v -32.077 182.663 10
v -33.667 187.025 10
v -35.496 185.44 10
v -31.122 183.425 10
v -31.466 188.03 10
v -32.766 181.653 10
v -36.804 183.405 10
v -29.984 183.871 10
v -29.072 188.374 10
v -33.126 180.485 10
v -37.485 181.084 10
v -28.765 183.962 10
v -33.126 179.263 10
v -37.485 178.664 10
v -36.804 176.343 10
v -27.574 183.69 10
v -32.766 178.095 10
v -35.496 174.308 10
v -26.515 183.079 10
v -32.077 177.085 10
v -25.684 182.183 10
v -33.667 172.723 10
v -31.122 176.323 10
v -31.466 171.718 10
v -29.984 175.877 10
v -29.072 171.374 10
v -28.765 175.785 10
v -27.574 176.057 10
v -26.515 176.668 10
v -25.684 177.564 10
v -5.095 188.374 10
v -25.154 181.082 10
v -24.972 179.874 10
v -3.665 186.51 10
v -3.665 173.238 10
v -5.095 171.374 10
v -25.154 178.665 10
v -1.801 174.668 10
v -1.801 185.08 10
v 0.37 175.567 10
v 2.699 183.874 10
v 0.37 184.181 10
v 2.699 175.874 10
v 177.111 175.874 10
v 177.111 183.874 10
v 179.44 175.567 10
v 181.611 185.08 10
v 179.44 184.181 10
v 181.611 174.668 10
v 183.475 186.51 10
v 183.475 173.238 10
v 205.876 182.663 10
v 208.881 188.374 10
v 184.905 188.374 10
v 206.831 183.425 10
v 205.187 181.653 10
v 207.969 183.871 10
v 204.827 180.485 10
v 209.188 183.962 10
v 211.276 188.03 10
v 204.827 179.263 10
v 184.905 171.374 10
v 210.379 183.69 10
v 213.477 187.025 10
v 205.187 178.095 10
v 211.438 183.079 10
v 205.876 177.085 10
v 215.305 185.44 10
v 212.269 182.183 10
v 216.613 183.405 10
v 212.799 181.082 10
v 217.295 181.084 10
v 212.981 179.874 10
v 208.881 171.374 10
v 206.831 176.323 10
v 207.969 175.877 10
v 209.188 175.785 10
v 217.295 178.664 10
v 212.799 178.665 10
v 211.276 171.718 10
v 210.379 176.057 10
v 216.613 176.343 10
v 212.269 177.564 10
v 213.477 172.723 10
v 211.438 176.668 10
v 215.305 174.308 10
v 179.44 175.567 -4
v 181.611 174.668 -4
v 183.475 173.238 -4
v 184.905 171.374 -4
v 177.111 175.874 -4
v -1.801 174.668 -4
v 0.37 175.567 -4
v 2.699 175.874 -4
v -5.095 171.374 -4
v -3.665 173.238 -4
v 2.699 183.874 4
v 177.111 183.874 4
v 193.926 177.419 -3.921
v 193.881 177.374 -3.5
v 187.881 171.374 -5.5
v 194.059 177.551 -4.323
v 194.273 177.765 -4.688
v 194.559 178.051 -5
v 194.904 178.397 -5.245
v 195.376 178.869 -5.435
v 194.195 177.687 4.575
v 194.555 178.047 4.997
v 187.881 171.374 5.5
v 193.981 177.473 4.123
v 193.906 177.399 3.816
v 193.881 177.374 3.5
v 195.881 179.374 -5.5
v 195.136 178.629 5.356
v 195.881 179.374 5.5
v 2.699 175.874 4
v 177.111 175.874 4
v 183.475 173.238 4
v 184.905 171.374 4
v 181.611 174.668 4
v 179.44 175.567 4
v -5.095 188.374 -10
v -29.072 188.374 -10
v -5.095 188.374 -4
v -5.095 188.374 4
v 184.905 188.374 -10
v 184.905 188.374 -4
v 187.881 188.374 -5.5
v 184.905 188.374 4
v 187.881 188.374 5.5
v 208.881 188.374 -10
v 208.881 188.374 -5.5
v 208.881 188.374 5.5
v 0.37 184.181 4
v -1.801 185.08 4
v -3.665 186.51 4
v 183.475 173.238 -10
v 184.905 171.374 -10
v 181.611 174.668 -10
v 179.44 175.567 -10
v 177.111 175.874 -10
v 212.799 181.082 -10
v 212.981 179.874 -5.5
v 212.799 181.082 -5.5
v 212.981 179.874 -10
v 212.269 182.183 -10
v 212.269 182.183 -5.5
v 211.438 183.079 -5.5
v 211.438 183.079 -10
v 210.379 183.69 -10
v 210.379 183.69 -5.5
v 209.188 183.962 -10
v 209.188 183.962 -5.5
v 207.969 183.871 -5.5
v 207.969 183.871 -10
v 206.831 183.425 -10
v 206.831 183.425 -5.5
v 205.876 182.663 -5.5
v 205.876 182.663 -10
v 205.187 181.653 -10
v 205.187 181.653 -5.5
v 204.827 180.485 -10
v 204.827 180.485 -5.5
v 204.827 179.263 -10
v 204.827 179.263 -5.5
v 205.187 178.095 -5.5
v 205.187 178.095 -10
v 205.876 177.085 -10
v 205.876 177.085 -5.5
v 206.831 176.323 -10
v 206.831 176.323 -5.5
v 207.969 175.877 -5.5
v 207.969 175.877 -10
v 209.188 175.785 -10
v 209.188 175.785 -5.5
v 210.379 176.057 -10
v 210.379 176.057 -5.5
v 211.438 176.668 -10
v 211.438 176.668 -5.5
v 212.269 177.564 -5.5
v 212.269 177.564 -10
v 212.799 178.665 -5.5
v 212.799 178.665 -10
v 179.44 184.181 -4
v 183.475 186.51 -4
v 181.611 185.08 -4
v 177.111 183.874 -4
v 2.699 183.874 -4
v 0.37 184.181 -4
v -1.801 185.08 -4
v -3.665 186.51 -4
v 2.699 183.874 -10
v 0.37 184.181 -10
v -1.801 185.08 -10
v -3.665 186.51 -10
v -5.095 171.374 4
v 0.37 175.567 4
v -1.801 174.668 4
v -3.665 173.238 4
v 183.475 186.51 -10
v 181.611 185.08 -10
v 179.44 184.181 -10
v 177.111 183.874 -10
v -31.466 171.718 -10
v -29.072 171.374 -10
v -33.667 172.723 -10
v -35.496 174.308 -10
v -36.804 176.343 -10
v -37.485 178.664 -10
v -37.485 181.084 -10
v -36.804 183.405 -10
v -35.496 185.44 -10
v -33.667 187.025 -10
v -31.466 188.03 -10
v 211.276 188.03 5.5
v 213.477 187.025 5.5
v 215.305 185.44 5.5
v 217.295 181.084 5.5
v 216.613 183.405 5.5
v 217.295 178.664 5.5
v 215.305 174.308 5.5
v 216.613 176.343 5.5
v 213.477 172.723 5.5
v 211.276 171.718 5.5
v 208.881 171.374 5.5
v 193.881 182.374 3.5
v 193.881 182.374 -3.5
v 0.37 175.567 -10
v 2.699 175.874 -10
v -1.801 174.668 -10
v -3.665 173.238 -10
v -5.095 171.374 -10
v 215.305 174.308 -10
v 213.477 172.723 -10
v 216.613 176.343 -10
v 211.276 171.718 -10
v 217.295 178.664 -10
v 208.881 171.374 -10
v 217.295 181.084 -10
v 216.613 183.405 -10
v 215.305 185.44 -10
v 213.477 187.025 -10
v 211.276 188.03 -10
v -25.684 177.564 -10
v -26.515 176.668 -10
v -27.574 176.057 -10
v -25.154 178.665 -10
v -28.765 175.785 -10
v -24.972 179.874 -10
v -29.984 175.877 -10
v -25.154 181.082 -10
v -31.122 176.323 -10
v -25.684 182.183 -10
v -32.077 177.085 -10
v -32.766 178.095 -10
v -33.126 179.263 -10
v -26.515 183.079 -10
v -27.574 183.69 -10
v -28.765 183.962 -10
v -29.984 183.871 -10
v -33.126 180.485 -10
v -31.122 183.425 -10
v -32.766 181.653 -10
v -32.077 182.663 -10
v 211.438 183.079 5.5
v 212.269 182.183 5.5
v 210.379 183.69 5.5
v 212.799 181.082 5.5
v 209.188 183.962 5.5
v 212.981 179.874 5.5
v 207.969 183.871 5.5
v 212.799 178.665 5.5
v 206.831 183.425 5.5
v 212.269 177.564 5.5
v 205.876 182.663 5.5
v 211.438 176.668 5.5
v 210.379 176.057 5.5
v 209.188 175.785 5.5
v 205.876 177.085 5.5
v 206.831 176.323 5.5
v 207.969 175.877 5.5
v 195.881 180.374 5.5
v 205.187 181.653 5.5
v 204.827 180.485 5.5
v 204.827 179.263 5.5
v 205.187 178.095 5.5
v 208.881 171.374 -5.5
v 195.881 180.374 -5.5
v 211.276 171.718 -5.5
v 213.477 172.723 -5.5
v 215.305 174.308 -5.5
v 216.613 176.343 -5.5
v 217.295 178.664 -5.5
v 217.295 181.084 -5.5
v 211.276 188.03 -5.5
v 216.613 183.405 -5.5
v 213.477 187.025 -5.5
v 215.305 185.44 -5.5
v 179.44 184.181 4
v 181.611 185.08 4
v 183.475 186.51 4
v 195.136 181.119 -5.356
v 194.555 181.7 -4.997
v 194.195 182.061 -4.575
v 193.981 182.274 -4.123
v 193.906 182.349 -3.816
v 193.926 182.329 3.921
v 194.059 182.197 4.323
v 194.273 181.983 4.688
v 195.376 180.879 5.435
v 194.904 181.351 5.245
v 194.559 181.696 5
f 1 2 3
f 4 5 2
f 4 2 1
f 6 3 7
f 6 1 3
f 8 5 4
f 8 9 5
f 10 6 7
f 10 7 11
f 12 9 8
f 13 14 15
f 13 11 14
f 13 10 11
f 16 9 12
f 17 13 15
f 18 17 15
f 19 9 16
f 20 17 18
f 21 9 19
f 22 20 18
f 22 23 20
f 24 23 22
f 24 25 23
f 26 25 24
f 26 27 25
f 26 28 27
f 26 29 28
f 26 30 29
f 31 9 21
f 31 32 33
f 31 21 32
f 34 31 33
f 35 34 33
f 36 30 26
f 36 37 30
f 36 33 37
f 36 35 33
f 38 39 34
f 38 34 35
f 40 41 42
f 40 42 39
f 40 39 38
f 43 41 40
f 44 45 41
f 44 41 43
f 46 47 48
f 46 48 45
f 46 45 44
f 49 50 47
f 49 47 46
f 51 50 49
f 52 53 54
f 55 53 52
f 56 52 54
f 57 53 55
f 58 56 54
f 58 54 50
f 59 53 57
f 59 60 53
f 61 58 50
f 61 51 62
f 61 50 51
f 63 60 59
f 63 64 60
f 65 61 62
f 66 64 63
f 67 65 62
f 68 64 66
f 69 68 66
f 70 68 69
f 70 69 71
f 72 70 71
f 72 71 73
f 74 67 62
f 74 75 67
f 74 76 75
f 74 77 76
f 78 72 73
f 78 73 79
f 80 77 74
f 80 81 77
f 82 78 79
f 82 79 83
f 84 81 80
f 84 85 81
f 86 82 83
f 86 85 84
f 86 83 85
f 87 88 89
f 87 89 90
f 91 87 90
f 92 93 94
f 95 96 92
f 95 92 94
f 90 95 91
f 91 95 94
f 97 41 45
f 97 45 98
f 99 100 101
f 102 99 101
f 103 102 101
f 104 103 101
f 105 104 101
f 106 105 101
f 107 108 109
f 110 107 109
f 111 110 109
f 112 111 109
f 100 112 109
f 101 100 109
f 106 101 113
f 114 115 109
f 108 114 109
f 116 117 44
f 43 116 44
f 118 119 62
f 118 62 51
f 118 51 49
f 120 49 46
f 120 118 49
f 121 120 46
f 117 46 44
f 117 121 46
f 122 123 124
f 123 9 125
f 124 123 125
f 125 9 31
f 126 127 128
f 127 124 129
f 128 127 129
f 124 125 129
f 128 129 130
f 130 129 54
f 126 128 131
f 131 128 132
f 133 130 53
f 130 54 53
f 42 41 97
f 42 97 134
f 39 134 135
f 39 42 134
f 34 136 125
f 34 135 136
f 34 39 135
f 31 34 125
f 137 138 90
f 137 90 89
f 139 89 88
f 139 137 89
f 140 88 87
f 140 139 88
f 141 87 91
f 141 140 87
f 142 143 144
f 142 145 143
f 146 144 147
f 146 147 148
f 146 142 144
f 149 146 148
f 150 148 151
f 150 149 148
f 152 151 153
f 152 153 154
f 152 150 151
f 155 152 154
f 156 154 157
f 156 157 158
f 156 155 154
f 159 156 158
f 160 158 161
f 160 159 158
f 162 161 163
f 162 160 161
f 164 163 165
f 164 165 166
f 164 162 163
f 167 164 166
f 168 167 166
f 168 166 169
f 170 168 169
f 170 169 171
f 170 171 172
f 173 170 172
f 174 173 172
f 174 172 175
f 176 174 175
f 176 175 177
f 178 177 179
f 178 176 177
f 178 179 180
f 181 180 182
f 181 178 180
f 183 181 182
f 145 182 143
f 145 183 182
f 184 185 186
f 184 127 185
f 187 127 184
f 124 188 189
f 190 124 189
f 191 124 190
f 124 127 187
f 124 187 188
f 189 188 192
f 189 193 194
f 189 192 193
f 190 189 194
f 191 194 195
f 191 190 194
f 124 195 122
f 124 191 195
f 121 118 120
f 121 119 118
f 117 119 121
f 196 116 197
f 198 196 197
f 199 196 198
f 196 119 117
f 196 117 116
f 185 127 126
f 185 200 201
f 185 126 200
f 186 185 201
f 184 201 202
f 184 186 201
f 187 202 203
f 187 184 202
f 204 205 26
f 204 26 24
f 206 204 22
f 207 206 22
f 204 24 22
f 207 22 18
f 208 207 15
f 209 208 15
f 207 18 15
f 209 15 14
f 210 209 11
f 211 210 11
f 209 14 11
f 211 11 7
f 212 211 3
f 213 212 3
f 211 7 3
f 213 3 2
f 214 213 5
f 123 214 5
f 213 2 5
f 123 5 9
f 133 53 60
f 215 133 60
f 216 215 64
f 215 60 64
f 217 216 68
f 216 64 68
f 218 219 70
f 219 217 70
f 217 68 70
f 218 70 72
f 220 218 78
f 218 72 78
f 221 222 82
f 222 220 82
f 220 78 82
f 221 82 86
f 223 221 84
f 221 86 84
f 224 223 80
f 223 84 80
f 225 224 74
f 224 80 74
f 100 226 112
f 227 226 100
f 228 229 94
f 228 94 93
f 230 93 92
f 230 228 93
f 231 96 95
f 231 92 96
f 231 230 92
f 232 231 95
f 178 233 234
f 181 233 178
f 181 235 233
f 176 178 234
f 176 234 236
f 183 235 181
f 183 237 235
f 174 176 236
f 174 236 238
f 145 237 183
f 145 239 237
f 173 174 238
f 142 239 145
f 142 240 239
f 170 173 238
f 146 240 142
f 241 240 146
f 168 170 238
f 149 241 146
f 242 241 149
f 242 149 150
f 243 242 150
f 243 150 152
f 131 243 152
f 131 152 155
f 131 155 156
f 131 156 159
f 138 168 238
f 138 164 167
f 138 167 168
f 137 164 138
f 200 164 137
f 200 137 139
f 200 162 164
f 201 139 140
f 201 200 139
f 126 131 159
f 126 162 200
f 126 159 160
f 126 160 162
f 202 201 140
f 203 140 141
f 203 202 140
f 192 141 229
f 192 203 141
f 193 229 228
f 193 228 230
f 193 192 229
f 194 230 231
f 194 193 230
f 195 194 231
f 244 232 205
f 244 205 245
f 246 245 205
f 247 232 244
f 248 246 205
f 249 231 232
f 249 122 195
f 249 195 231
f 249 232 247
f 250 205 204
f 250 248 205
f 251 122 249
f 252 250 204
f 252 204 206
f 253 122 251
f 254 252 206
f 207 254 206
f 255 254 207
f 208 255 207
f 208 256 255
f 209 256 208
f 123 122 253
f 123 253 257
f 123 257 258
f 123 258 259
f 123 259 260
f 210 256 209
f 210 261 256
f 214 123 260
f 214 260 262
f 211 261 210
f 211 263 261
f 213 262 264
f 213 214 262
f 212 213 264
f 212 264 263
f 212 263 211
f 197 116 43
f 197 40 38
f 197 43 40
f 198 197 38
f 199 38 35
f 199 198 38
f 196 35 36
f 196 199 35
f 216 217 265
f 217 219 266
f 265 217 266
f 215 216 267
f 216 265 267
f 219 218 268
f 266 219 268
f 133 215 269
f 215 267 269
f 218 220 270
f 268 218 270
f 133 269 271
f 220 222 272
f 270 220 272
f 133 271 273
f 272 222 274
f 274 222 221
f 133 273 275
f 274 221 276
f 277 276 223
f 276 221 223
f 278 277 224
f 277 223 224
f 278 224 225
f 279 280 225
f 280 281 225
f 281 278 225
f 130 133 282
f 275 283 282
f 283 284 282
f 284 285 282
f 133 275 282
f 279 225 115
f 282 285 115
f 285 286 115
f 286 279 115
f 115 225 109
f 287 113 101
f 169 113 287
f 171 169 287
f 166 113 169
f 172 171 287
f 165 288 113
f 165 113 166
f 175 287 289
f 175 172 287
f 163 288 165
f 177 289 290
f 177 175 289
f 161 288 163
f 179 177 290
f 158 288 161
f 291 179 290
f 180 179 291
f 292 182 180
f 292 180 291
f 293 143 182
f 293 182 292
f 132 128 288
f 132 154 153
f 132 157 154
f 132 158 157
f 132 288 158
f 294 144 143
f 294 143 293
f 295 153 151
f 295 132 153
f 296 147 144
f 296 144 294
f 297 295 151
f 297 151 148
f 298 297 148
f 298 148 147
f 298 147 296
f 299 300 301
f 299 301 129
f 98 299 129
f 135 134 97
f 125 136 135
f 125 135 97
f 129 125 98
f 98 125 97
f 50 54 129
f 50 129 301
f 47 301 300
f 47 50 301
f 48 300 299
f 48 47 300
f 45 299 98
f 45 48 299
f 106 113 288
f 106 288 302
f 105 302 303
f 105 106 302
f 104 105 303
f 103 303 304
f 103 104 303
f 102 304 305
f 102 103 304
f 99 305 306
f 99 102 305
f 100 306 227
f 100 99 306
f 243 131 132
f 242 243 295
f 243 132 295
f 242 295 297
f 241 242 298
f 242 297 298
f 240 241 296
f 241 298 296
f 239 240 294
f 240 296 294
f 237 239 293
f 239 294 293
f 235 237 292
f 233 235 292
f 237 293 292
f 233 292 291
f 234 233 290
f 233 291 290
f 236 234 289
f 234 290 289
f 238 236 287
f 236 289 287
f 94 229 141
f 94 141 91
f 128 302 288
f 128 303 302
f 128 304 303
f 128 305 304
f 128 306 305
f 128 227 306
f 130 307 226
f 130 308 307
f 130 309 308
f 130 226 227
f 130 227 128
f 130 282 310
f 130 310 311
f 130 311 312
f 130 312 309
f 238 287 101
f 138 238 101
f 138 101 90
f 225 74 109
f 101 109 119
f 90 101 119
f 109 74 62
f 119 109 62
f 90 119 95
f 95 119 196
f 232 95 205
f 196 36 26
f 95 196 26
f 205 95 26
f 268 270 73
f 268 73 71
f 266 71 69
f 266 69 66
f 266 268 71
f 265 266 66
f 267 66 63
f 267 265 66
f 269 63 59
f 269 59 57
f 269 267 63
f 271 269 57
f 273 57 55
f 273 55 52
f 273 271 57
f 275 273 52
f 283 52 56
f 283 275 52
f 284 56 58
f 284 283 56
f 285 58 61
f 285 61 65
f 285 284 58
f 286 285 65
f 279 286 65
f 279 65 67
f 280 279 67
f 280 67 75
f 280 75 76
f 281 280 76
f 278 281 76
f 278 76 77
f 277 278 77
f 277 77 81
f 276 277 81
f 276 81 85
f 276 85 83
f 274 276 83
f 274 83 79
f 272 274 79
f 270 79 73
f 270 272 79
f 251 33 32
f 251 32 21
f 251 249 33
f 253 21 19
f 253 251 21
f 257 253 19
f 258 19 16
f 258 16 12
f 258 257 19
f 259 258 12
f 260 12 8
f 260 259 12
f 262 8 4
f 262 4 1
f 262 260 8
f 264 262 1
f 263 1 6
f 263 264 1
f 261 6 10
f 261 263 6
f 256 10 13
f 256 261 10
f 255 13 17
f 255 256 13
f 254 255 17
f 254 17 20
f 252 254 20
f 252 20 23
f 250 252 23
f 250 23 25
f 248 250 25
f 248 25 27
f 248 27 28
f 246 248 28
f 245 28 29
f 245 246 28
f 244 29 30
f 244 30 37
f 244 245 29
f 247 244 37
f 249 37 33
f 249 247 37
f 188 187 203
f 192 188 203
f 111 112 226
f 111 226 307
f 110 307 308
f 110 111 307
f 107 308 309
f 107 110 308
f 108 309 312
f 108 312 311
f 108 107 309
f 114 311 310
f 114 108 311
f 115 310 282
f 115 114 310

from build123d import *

# Parameters (mm, degrees)
ESBO_O1_R                = 4.1
RESSALTO_EXTRUS_O1_DEPTH = 10
ESBO_O2_W                = 23.5
ESBO_O2_H                = 11
CORTE_EXTRUS_O1_DEPTH    = 219.274311432
FILETE1_R                = 2
ESBO_O4_W                = 190
ESBO_O4_H                = 36.622024969
CORTE_EXTRUS_O3_DEPTH    = 289.339020898
RESSALTO_EXTRUS_O2_DEPTH = 190
FILETE3_R                = 9
CORTE_EXTRUS_O4_DEPTH    = 5.5


with BuildPart() as part:
    # Esboço1 → Ressalto-extrusão1 (new, symmetric)
    with BuildSketch(Plane.XY):
        with BuildLine():
            Line((-29.071712183, 188.373872767), (208.88140452, 188.373872767))
            ThreePointArc((208.88140452, 188.373872767), (217.38140452, 179.873872767), (208.88140452, 171.373872767))
            Line((208.88140452, 171.373872767), (-29.071712183, 171.373872767))
            ThreePointArc((-29.071712183, 171.373872767), (-37.571712183, 179.873872767), (-29.071712183, 188.373872767))
        make_face()
        with Locations((-29.071712183, 179.873872767)):
            Circle(ESBO_O1_R, mode=Mode.SUBTRACT)
        with Locations((208.88140452, 179.873872767)):
            Circle(ESBO_O1_R, mode=Mode.SUBTRACT)
    extrude(amount=RESSALTO_EXTRUS_O1_DEPTH, both=True)

    # Esboço2 → Corte-extrusão1 (cut, through all)
    with BuildSketch(Plane(origin=(0, 188.373872767, 0), x_dir=(1, 0, 0), z_dir=(0, 1, 0))):
        with Locations((205.63140452, 0)):
            Rectangle(ESBO_O2_W, ESBO_O2_H)
    extrude(amount=-CORTE_EXTRUS_O1_DEPTH, mode=Mode.SUBTRACT)

    # Filete1
    filete1_edges = [part.edges().sort_by_distance(p)[0] for p in [
        (193.88140452, 179.873872767, -5.5),
        (193.88140452, 179.873872767, 5.5),
    ]]
    fillet(filete1_edges, radius=FILETE1_R)

    # Esboço4 → Corte-extrusão3 (cut, through all)
    with BuildSketch(Plane.XY.offset(10)):
        with Locations((89.904846169, 172.82617811)):
            Rectangle(ESBO_O4_W, ESBO_O4_H)
    extrude(amount=-CORTE_EXTRUS_O3_DEPTH, mode=Mode.SUBTRACT)


with BuildPart() as corte_extrus_o3_piece_1:
    # of the separate pieces the step leaves, piece 1, a body of its own (corte_extrus_o3_pieces)
    add(part.part.solids().sort_by_distance((-5.095153831, 188.373872767, -10))[0])



with BuildPart() as corte_extrus_o3_piece_2:
    # of the separate pieces the step leaves, piece 2, a body of its own (corte_extrus_o3_pieces)
    add(part.part.solids().sort_by_distance((193.88140452, 188.373872767, 3.5))[0])


with BuildPart() as corte_extrus_o3_piece_1_1:
    add(corte_extrus_o3_piece_1.part)

    add(corte_extrus_o3_piece_2.part)  # Ressalto-extrusão2 merges Corte-extrusão3 piece 2
    # Esboço5 → Ressalto-extrusão2 (add)
    with BuildSketch(Plane(origin=(-5.095153831, 0, 0), x_dir=(0, 0, -1), z_dir=(1, 0, 0))):
        Polygon((4, 171.373872767), (-4, 171.373872767), (-4, 175.873872767), (-10, 175.873872767), (-10, 183.873872767), (-4, 183.873872767), (-4, 188.373872767), (4, 188.373872767), (4, 183.873872767), (10, 183.873872767), (10, 175.873872767), (4, 175.873872767), align=None)
    extrude(amount=RESSALTO_EXTRUS_O2_DEPTH)

    # Filete3
    # the kernel refuses this fillet: 9 mm, written as the material it adds along each edge
    with BuildSketch(Plane(origin=(-5.095153831, 183.873872767, 10), x_dir=(1, 0, 0), z_dir=(0, 0, -1))) as filete3_piece_1_section:
        with BuildLine():
            CenterArc((7.794228634, -9), FILETE3_R, 90, 60)
            Line((0, -4.5), (-0.155884573, -4.41))
            ThreePointArc((-0.155884573, -4.41), (-0.18, -2.25), (-0.18, 0))
            Line((-0.18, 0), (0, 0.18))
            Line((0, 0.18), (7.794228634, 0.18))
            Line((7.794228634, 0.18), (7.794228634, 0))
        make_face()
    filete3_piece_1 = extrude(amount=25.485571585, mode=Mode.PRIVATE)
    filete3_piece_1 = split(filete3_piece_1, bisect_by=Plane(origin=(-5.095153831, 183.873872767, -10), z_dir=(0, 0, 1)), keep=Keep.TOP, mode=Mode.PRIVATE)
    add(filete3_piece_1)
    with BuildSketch(Plane(origin=(184.904846169, 175.873872767, -15.485571585), x_dir=(0, -1, 0), z_dir=(0, 0, 1))) as filete3_piece_2_section:
        with BuildLine():
            CenterArc((9, -7.794228634), FILETE3_R, 120, 60)
            Line((0, -7.794228634), (-0.18, -7.794228634))
            Line((-0.18, -7.794228634), (-0.18, 0))
            Line((-0.18, 0), (0, 0.18))
            ThreePointArc((0, 0.18), (2.25, 0.18), (4.41, 0.155884573))
            Line((4.41, 0.155884573), (4.5, 0))
        make_face()
    filete3_piece_2 = extrude(amount=25.485571585, mode=Mode.PRIVATE)
    filete3_piece_2 = split(filete3_piece_2, bisect_by=Plane(origin=(184.904846169, 175.873872767, -10), z_dir=(0, 0, 1)), keep=Keep.TOP, mode=Mode.PRIVATE)
    add(filete3_piece_2)
    with BuildSketch(Plane(origin=(184.904846169, 175.873872767, -10), x_dir=(0, -1, 0), z_dir=(0, 0, 1))) as filete3_piece_3_section:
        with BuildLine():
            CenterArc((9, -7.794228634), FILETE3_R, 120, 60)
            Line((0, -7.794228634), (-0.18, -7.794228634))
            Line((-0.18, -7.794228634), (-0.18, 0))
            Line((-0.18, 0), (0, 0.18))
            ThreePointArc((0, 0.18), (2.25, 0.18), (4.41, 0.155884573))
            Line((4.41, 0.155884573), (4.5, 0))
        make_face()
    filete3_piece_3 = extrude(amount=25.485571585, mode=Mode.PRIVATE)
    filete3_piece_3 = split(filete3_piece_3, bisect_by=Plane(origin=(184.904846169, 175.873872767, 10), z_dir=(0, 0, -1)), keep=Keep.TOP, mode=Mode.PRIVATE)
    add(filete3_piece_3)
    with BuildSketch(Plane(origin=(184.904846169, 183.873872767, 10), x_dir=(0, 1, 0), z_dir=(0, 0, -1))) as filete3_piece_4_section:
        with BuildLine():
            CenterArc((9, -7.794228634), FILETE3_R, 120, 60)
            Line((0, -7.794228634), (-0.18, -7.794228634))
            Line((-0.18, -7.794228634), (-0.18, 0))
            Line((-0.18, 0), (0, 0.18))
            ThreePointArc((0, 0.18), (2.25, 0.18), (4.41, 0.155884573))
            Line((4.41, 0.155884573), (4.5, 0))
        make_face()
    filete3_piece_4 = extrude(amount=25.485571585, mode=Mode.PRIVATE)
    filete3_piece_4 = split(filete3_piece_4, bisect_by=Plane(origin=(184.904846169, 183.873872767, -10), z_dir=(0, 0, 1)), keep=Keep.TOP, mode=Mode.PRIVATE)
    add(filete3_piece_4)
    with BuildSketch(Plane(origin=(184.904846169, 183.873872767, 15.485571585), x_dir=(0, 1, 0), z_dir=(0, 0, -1))) as filete3_piece_5_section:
        with BuildLine():
            CenterArc((9, -7.794228634), FILETE3_R, 120, 60)
            Line((0, -7.794228634), (-0.18, -7.794228634))
            Line((-0.18, -7.794228634), (-0.18, 0))
            Line((-0.18, 0), (0, 0.18))
            ThreePointArc((0, 0.18), (2.25, 0.18), (4.41, 0.155884573))
            Line((4.41, 0.155884573), (4.5, 0))
        make_face()
    filete3_piece_5 = extrude(amount=25.485571585, mode=Mode.PRIVATE)
    filete3_piece_5 = split(filete3_piece_5, bisect_by=Plane(origin=(184.904846169, 183.873872767, 10), z_dir=(0, 0, -1)), keep=Keep.TOP, mode=Mode.PRIVATE)
    add(filete3_piece_5)
    with BuildSketch(Plane(origin=(-5.095153831, 175.873872767, -10), x_dir=(1, 0, 0), z_dir=(0, 0, 1))) as filete3_piece_6_section:
        with BuildLine():
            CenterArc((7.794228634, -9), FILETE3_R, 90, 60)
            Line((0, -4.5), (-0.155884573, -4.41))
            ThreePointArc((-0.155884573, -4.41), (-0.18, -2.25), (-0.18, 0))
            Line((-0.18, 0), (0, 0.18))
            Line((0, 0.18), (7.794228634, 0.18))
            Line((7.794228634, 0.18), (7.794228634, 0))
        make_face()
    filete3_piece_6 = extrude(amount=25.485571585, mode=Mode.PRIVATE)
    filete3_piece_6 = split(filete3_piece_6, bisect_by=Plane(origin=(-5.095153831, 175.873872767, 10), z_dir=(0, 0, -1)), keep=Keep.TOP, mode=Mode.PRIVATE)
    add(filete3_piece_6)
    with BuildSketch(Plane(origin=(-5.095153831, 183.873872767, 15.485571585), x_dir=(0, 1, 0), z_dir=(0, 0, -1))) as filete3_piece_7_section:
        with BuildLine():
            CenterArc((9, 7.794228634), FILETE3_R, 180, 60)
            Line((0, 7.794228634), (-0.18, 7.794228634))
            Line((-0.18, 7.794228634), (-0.18, 0))
            Line((-0.18, 0), (0, -0.18))
            ThreePointArc((0, -0.18), (2.25, -0.18), (4.41, -0.155884573))
            Line((4.41, -0.155884573), (4.5, 0))
        make_face()
    filete3_piece_7 = extrude(amount=25.485571585, mode=Mode.PRIVATE)
    filete3_piece_7 = split(filete3_piece_7, bisect_by=Plane(origin=(-5.095153831, 183.873872767, 10), z_dir=(0, 0, -1)), keep=Keep.TOP, mode=Mode.PRIVATE)
    add(filete3_piece_7)
    with BuildSketch(Plane(origin=(-5.095153831, 175.873872767, -15.485571585), x_dir=(1, 0, 0), z_dir=(0, 0, 1))) as filete3_piece_8_section:
        with BuildLine():
            CenterArc((7.794228634, -9), FILETE3_R, 90, 60)
            Line((0, -4.5), (-0.155884573, -4.41))
            ThreePointArc((-0.155884573, -4.41), (-0.18, -2.25), (-0.18, 0))
            Line((-0.18, 0), (0, 0.18))
            Line((0, 0.18), (7.794228634, 0.18))
            Line((7.794228634, 0.18), (7.794228634, 0))
        make_face()
    filete3_piece_8 = extrude(amount=25.485571585, mode=Mode.PRIVATE)
    filete3_piece_8 = split(filete3_piece_8, bisect_by=Plane(origin=(-5.095153831, 175.873872767, -10), z_dir=(0, 0, 1)), keep=Keep.TOP, mode=Mode.PRIVATE)
    add(filete3_piece_8)

    # Esboço6 → Corte-extrusão4 (cut, symmetric)
    with BuildSketch(Plane.XY):
        Polygon((208.88140452, 179.873872767), (196.38140452, 179.873872767), (187.88140452, 188.373872767), (187.88140452, 194.300401894), (208.88140452, 194.300401894), align=None)
    corte_extrus_o4 = extrude(amount=CORTE_EXTRUS_O4_DEPTH, both=True, mode=Mode.SUBTRACT)

    # Espelhar1: Corte-extrusão4 across plane
    add(corte_extrus_o4.mirror(Plane.ZX.offset(179.873872767)), mode=Mode.SUBTRACT)


solid = corte_extrus_o3_piece_1_1.part
